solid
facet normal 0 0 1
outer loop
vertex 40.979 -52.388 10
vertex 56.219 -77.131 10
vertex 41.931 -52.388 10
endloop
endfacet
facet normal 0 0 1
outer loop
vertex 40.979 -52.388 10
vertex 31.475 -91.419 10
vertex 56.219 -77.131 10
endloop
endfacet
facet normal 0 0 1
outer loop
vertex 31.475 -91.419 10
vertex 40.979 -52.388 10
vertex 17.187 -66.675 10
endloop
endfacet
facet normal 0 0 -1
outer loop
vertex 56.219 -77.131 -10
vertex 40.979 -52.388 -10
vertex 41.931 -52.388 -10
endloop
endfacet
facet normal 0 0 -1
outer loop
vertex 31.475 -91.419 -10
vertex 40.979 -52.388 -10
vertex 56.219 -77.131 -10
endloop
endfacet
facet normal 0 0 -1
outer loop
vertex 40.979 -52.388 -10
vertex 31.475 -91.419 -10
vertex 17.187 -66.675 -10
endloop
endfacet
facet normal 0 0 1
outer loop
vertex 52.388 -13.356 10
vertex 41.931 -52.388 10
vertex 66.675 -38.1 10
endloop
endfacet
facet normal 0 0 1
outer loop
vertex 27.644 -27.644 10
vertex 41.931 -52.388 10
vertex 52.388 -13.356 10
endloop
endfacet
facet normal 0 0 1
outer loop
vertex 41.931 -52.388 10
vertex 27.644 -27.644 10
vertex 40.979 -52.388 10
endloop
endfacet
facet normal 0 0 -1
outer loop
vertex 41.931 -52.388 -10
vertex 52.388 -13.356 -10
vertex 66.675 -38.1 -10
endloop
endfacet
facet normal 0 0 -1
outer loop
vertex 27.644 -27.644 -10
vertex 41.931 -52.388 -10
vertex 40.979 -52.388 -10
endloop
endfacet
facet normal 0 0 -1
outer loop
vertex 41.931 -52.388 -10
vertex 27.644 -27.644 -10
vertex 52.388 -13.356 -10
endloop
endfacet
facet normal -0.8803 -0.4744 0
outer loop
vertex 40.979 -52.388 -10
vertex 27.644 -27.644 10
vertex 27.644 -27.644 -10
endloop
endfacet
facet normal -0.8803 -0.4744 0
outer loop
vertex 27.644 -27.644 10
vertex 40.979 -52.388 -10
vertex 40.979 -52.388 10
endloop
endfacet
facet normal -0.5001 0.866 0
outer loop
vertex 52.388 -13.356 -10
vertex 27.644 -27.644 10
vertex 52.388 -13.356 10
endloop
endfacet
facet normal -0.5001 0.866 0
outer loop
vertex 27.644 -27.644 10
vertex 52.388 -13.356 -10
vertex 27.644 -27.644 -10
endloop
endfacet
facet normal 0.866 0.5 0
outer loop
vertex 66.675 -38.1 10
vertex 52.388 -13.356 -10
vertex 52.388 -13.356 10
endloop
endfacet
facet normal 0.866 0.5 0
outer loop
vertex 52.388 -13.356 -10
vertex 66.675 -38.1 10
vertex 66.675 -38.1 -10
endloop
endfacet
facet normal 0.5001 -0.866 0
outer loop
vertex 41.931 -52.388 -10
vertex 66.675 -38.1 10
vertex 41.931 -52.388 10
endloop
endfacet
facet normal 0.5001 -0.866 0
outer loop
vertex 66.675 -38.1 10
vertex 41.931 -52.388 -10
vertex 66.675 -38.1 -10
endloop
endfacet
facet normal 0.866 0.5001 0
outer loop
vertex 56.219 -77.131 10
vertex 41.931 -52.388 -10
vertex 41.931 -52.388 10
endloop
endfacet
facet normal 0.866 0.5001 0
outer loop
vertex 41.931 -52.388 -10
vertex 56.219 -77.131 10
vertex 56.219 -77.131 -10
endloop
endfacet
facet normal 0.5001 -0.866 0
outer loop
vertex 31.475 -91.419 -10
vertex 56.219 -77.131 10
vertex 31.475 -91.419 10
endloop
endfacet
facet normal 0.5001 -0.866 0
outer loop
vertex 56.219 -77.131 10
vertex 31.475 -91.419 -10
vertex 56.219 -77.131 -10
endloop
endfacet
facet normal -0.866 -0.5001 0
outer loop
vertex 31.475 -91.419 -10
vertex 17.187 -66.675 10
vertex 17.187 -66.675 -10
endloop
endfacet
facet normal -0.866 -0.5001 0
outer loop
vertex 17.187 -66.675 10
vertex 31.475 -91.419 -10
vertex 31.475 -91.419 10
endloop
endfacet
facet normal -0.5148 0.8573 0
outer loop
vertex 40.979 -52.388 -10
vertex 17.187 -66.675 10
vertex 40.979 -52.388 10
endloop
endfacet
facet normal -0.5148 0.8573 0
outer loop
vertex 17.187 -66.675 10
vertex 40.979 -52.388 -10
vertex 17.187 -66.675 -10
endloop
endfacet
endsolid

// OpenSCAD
polyhedron(
    points=[
    [40.9786666666667, -52.3875, 10],
    [27.6436666666667, -27.6436666666667, 10],
    [52.3875, -13.3561666666667, 10],
    [66.675, -38.1, 10],
    [41.9311666666667, -52.3875, 10],
    [56.2186666666667, -77.1313333333333, 10],
    [31.4748333333333, -91.4188333333333, 10],
    [17.1873333333333, -66.675, 10],
    [40.9786666666667, -52.3875, -10],
    [27.6436666666667, -27.6436666666667, -10],
    [52.3875, -13.3561666666667, -10],
    [66.675, -38.1, -10],
    [41.9311666666667, -52.3875, -10],
    [56.2186666666667, -77.1313333333333, -10],
    [31.4748333333333, -91.4188333333333, -10],
    [17.1873333333333, -66.675, -10],
    ],
    faces=[
        [4,5,6,7,0],
        [8,15,14,13,12],
        [0,1,2,3,4],
        [12,11,10,9,8],
        [0,8,9,1],
        [1,9,10,2],
        [2,10,11,3],
        [3,11,12,4],
        [4,12,13,5],
        [5,13,14,6],
        [6,14,15,7],
        [7,15,8,0],
    ]
);
